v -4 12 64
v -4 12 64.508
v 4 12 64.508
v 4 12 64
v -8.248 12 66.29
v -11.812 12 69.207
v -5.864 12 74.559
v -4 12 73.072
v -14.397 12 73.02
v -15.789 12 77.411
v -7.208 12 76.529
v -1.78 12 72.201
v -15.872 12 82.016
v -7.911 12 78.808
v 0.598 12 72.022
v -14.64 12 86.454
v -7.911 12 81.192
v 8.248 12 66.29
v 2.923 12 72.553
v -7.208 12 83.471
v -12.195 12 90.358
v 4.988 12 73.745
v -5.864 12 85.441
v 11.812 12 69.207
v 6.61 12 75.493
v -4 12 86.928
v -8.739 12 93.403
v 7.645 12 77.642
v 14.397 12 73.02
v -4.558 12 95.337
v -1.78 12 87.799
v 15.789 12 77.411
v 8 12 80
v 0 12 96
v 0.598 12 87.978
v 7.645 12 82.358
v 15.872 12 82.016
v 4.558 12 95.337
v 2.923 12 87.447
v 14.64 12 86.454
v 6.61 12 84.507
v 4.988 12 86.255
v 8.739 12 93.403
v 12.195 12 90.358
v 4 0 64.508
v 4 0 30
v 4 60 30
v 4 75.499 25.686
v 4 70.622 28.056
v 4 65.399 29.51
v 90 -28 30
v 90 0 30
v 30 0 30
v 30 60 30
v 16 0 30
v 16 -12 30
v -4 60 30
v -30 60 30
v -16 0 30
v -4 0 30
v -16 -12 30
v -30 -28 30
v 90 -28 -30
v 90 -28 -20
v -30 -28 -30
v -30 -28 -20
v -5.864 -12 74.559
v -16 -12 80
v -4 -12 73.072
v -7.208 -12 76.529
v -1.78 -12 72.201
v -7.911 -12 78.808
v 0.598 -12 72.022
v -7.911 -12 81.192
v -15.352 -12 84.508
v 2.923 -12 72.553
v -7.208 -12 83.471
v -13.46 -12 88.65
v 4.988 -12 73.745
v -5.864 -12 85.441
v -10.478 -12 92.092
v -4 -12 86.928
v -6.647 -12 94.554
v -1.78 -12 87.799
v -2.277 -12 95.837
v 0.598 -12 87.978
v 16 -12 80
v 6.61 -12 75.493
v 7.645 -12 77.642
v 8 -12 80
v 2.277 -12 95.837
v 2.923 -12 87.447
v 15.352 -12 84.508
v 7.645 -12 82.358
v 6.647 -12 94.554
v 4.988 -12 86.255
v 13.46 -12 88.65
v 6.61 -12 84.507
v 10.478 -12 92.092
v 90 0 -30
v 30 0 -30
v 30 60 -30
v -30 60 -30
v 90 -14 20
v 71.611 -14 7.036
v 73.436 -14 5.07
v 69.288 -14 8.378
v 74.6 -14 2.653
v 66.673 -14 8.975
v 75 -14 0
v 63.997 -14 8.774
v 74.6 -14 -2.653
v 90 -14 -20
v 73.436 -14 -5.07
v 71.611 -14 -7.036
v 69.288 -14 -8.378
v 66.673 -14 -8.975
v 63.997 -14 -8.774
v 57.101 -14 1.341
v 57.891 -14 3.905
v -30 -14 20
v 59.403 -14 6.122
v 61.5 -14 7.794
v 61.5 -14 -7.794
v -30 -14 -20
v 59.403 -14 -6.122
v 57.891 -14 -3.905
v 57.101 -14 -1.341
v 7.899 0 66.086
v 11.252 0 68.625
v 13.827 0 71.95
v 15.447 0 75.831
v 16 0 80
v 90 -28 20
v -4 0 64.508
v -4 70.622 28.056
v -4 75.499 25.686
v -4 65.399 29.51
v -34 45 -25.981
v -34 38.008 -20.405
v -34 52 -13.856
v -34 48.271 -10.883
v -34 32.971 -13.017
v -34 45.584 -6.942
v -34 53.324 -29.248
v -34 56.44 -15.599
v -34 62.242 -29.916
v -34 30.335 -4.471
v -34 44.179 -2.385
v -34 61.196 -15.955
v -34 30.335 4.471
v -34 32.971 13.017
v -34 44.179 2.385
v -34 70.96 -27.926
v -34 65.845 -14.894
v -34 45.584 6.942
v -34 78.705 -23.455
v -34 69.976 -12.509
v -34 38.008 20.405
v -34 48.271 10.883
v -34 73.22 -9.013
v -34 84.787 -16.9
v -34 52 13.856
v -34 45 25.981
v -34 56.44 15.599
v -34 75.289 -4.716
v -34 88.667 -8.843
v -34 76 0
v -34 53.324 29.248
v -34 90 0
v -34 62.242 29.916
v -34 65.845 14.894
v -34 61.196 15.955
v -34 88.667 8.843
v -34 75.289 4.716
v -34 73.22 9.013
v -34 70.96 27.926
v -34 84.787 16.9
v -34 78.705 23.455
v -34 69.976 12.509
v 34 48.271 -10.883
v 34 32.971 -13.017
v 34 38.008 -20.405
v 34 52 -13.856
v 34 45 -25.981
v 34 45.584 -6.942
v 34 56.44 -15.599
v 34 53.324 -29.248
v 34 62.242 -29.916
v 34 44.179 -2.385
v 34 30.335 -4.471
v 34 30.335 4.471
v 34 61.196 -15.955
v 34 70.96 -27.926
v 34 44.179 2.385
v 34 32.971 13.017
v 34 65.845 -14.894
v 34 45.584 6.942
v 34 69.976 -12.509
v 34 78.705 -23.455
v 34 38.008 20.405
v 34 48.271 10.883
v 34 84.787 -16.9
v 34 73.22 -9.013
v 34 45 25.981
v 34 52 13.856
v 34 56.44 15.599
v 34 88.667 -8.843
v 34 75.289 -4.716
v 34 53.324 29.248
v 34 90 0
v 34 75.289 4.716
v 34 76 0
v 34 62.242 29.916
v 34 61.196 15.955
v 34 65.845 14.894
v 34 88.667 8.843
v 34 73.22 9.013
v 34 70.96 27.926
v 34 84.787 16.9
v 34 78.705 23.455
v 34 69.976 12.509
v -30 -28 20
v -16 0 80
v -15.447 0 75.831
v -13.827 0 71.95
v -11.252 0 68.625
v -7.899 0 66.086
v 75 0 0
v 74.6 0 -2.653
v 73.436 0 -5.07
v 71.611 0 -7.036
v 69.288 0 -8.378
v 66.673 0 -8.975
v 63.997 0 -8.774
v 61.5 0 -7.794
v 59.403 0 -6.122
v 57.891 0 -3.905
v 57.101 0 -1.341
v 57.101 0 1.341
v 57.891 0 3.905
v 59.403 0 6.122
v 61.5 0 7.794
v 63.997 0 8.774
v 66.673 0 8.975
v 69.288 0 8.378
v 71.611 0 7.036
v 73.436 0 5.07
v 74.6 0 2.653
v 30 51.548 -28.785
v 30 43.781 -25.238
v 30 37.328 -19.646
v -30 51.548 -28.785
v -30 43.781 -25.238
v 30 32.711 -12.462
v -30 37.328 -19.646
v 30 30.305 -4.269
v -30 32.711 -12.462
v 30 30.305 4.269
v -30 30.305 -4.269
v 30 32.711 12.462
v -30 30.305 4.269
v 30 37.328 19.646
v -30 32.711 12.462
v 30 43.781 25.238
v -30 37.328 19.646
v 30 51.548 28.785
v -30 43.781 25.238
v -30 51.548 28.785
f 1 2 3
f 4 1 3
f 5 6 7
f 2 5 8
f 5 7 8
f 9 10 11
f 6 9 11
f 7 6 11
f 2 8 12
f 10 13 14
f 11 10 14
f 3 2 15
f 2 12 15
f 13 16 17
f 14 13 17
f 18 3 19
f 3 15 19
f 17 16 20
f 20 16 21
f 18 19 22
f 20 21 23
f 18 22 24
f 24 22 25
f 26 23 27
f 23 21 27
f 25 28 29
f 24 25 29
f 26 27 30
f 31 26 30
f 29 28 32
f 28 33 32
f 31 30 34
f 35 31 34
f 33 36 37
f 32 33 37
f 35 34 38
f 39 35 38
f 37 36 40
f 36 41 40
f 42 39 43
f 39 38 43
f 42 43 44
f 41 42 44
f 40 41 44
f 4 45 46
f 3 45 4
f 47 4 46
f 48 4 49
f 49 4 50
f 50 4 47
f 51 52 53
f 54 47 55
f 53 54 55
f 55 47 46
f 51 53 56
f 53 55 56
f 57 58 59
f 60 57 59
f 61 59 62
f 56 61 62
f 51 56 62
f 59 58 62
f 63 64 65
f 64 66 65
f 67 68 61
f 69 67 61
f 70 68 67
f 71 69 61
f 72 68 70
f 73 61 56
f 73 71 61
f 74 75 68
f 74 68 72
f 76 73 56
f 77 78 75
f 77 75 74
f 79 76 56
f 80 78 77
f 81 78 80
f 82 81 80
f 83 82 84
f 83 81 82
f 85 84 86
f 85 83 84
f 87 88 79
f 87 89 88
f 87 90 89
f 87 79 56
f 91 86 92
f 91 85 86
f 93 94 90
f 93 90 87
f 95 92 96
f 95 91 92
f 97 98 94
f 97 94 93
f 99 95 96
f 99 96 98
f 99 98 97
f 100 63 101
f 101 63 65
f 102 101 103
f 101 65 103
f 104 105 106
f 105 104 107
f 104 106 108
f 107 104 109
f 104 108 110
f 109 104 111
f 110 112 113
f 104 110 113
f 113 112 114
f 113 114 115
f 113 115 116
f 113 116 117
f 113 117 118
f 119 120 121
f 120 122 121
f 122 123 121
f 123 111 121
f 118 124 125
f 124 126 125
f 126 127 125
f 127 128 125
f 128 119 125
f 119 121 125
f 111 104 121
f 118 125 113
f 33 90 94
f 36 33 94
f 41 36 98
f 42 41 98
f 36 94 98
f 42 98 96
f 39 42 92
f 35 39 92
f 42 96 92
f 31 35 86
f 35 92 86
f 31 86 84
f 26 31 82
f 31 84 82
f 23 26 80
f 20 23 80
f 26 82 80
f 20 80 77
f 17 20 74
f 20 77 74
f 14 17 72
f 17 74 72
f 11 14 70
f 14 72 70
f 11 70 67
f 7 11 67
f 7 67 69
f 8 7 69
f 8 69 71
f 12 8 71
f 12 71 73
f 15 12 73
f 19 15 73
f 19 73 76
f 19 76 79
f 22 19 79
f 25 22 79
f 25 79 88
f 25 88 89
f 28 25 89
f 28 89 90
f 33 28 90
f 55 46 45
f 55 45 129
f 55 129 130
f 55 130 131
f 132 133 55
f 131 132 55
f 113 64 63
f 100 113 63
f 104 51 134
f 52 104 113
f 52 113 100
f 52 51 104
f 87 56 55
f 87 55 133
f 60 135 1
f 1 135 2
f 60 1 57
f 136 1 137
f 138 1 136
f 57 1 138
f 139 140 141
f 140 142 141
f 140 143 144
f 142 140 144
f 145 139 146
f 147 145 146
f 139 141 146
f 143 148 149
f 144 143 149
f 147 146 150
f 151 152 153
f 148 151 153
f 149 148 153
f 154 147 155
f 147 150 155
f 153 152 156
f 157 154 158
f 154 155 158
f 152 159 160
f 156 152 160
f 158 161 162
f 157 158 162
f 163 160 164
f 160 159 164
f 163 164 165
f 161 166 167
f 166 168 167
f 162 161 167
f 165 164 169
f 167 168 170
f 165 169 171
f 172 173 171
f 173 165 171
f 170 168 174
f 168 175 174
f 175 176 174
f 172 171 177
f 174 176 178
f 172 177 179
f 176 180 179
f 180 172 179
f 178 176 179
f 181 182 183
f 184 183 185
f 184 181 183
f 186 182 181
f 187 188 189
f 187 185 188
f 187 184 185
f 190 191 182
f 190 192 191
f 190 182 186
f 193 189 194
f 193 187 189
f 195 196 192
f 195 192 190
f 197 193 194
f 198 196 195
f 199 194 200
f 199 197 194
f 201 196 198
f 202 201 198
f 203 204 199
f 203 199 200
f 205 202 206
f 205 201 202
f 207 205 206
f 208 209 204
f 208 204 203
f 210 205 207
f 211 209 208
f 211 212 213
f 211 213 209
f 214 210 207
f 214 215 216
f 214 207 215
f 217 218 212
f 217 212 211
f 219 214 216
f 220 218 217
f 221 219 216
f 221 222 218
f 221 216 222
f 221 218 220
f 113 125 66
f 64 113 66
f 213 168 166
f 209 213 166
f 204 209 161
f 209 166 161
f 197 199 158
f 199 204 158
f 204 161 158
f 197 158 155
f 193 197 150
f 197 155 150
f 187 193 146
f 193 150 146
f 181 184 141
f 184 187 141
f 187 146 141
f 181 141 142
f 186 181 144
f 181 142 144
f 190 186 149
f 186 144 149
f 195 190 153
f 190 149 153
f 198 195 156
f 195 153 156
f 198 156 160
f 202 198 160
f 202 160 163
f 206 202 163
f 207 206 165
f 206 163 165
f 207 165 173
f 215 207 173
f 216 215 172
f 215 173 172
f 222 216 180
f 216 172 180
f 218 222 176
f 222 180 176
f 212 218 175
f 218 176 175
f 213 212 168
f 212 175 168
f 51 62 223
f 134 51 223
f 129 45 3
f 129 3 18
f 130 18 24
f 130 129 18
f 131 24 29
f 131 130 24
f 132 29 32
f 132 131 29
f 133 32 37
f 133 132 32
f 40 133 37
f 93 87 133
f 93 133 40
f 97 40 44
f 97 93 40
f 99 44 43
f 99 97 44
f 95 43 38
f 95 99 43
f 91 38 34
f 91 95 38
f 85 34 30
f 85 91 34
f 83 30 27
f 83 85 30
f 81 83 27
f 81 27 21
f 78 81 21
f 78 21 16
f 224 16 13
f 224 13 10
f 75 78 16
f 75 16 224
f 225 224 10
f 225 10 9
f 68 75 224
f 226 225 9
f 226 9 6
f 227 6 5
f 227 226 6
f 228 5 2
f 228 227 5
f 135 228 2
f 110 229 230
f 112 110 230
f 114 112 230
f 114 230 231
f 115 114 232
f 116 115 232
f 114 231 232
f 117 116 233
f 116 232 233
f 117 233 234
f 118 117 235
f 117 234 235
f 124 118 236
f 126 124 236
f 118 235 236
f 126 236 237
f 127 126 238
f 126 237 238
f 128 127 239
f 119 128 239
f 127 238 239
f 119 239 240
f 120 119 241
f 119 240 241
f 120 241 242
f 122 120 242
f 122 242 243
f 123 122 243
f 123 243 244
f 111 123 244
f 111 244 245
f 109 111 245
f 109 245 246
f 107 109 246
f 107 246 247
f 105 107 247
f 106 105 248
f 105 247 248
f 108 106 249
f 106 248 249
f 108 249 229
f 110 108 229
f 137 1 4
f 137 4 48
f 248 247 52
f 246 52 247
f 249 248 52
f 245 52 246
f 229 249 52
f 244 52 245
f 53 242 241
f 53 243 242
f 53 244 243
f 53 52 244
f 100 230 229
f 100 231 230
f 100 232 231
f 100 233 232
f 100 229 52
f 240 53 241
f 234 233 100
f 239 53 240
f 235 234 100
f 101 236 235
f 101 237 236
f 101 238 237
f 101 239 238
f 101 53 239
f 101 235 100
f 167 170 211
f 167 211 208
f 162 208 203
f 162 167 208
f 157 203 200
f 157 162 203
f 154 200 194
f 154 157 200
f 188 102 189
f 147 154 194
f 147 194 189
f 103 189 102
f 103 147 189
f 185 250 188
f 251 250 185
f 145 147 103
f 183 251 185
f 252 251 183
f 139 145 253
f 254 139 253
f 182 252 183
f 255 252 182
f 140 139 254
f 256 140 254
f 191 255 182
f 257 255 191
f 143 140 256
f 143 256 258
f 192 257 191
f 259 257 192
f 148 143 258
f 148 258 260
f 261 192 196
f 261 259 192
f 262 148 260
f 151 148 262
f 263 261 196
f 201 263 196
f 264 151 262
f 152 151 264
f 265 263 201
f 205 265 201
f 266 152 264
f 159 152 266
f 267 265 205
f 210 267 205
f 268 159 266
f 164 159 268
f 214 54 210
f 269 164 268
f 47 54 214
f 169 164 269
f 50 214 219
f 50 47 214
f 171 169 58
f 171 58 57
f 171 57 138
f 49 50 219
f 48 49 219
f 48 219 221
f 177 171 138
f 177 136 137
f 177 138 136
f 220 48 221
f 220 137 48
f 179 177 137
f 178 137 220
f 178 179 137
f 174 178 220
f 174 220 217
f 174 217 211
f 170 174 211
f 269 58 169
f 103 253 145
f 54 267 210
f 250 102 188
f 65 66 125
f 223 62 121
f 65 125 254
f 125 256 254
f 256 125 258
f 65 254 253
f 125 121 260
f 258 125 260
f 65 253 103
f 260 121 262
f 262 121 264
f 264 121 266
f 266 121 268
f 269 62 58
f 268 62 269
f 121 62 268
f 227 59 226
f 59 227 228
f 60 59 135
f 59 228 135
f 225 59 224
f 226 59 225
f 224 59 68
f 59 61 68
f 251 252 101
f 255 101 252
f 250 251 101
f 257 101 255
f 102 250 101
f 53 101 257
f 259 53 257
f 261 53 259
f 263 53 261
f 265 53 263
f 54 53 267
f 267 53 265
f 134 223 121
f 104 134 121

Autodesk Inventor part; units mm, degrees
ref_plane "YZ Plane" through (0, 0, 0) normal (1, 0, 0) x (0, 1, 0)
ref_plane "XZ Plane" through (0, 0, 0) normal (0, 1, 0) x (-1, 0, 0)
ref_plane "XY Plane" through (0, 0, 0) normal (0, 0, 1) x (1, 0, 0)
sketch "Náčrt1" plane through (0, 0, 0) normal (1, 0, 0) x (0, 1, 0)
  circle A0 centre (60, 0) radius 16
  circle A1 centre (60, 0) radius 30
  line L0 (0, 30) -> (0, -30)
  line L1 (0, -30) -> (60, -30)
  line L2 (0, 30) -> (60, 30)
  line L3 (0, 30) -> (0, 68)
  line L4 (0, 68) -> (12, 68)
  line L5 (12, 68) -> (12, 64)
  line L6 (12, 64) -> (75.4986, 25.6864)
  line L7 (0, 68) -> (-12, 68)
  line L8 (-12, 68) -> (-12, 30)
  line L9 (-12, 30) -> (-28, 30)
  line L10 (-28, 30) -> (-28, 20)
  line L11 (-28, 20) -> (-14, 20)
  line L12 (-14, 20) -> (-14, -20)
  line L13 (-14, -20) -> (-28, -20)
  line L14 (-28, -20) -> (-28, -30)
  line L15 (-28, -30) -> (0, -30)
  line L16 (0, 30) -> (-12, 30)
  point P0 (0, 0)
  dimension "d0" = 32
  dimension "d1" = 60
  dimension "d2" = 12
  dimension "d3" = 31.106
  dimension "d4" = 60
  dimension "d5" = 38
  dimension "d6" = 10
  dimension "d7" = 50
  dimension "d8" = 24
  dimension "d9" = 26
  dimension "d10" = 40
  dimension "d11" = 60.9972
  dimension "d12" = 30
  dimension "d13" = 12
extrude "Vysunutí1" add sketch "Náčrt1" against normal blind 34 contours A1
extrude "Vysunutí2" add sketch "Náčrt1" against normal blind 4 contours A1 L2 L3 L4 L5 L6
extrude "Vysunutí3" add sketch "Náčrt1" against normal blind 30 contours L1 L0 L2 A1
extrude "Vysunutí4" add sketch "Náčrt1" against normal blind 16 contours L16 L8 L7 L3
extrude "Vysunutí5" add sketch "Náčrt1" against normal blind 30 contours L15 L14 L13 L12 L11 L10 L9 L16 L0
extrude "Vysunutí6" add sketch "Náčrt1" along normal blind 34 contours A1
extrude "Vysunutí7" add sketch "Náčrt1" along normal blind 30 contours L1 L0 L2 A1
extrude "Vysunutí8" add sketch "Náčrt1" along normal blind 4 contours A1 L2 L3 L4 L5 L6
extrude "Vysunutí9" add sketch "Náčrt1" along normal blind 16 contours L16 L8 L7 L3
extrude "Vysunutí10" add sketch "Náčrt1" along normal blind 90 contours L15 L14 L13 L12 L11 L10 L9 L16 L0
sketch "Náčrt2" plane through (-16, -12, 30) normal (0, -1, 0) x (1, 0, 0)
  circle A0 centre (16, 50) radius 16
  circle A1 centre (16, 50) radius 8
  line L0 (20, 38) -> (32, 38) projected
  line L1 (32, 38) -> (32, 50)
  line L2 (0, 38) -> (0, 50)
  line L3 (32, 38) -> (26.583, 38)
  line L4 (12, 38) -> (0, 38) projected
  line L5 (0, 38) -> (5.417, 38)
  point P0 (16, -30)
  dimension "d34" = 32
  dimension "d35" = 16
  dimension "d36" = 12
extrude "Vysunutí11" add sketch "Náčrt2" against normal blind 24 contours A0
extrude "Vysunutí12" add sketch "Náčrt2" against normal blind 12 contours L1 L0 A0 | A0 L4 L2
sketch "Náčrt3" plane through (30, 0, 30) normal (0, 1, 0) x (1, 0, 0)
  circle A0 centre (36, 30) radius 9
  point P0 (-30, 30)
  dimension "d41" = 18
extrude "Vysunutí13" cut sketch "Náčrt3" against normal blind 14
properties part number "6"
